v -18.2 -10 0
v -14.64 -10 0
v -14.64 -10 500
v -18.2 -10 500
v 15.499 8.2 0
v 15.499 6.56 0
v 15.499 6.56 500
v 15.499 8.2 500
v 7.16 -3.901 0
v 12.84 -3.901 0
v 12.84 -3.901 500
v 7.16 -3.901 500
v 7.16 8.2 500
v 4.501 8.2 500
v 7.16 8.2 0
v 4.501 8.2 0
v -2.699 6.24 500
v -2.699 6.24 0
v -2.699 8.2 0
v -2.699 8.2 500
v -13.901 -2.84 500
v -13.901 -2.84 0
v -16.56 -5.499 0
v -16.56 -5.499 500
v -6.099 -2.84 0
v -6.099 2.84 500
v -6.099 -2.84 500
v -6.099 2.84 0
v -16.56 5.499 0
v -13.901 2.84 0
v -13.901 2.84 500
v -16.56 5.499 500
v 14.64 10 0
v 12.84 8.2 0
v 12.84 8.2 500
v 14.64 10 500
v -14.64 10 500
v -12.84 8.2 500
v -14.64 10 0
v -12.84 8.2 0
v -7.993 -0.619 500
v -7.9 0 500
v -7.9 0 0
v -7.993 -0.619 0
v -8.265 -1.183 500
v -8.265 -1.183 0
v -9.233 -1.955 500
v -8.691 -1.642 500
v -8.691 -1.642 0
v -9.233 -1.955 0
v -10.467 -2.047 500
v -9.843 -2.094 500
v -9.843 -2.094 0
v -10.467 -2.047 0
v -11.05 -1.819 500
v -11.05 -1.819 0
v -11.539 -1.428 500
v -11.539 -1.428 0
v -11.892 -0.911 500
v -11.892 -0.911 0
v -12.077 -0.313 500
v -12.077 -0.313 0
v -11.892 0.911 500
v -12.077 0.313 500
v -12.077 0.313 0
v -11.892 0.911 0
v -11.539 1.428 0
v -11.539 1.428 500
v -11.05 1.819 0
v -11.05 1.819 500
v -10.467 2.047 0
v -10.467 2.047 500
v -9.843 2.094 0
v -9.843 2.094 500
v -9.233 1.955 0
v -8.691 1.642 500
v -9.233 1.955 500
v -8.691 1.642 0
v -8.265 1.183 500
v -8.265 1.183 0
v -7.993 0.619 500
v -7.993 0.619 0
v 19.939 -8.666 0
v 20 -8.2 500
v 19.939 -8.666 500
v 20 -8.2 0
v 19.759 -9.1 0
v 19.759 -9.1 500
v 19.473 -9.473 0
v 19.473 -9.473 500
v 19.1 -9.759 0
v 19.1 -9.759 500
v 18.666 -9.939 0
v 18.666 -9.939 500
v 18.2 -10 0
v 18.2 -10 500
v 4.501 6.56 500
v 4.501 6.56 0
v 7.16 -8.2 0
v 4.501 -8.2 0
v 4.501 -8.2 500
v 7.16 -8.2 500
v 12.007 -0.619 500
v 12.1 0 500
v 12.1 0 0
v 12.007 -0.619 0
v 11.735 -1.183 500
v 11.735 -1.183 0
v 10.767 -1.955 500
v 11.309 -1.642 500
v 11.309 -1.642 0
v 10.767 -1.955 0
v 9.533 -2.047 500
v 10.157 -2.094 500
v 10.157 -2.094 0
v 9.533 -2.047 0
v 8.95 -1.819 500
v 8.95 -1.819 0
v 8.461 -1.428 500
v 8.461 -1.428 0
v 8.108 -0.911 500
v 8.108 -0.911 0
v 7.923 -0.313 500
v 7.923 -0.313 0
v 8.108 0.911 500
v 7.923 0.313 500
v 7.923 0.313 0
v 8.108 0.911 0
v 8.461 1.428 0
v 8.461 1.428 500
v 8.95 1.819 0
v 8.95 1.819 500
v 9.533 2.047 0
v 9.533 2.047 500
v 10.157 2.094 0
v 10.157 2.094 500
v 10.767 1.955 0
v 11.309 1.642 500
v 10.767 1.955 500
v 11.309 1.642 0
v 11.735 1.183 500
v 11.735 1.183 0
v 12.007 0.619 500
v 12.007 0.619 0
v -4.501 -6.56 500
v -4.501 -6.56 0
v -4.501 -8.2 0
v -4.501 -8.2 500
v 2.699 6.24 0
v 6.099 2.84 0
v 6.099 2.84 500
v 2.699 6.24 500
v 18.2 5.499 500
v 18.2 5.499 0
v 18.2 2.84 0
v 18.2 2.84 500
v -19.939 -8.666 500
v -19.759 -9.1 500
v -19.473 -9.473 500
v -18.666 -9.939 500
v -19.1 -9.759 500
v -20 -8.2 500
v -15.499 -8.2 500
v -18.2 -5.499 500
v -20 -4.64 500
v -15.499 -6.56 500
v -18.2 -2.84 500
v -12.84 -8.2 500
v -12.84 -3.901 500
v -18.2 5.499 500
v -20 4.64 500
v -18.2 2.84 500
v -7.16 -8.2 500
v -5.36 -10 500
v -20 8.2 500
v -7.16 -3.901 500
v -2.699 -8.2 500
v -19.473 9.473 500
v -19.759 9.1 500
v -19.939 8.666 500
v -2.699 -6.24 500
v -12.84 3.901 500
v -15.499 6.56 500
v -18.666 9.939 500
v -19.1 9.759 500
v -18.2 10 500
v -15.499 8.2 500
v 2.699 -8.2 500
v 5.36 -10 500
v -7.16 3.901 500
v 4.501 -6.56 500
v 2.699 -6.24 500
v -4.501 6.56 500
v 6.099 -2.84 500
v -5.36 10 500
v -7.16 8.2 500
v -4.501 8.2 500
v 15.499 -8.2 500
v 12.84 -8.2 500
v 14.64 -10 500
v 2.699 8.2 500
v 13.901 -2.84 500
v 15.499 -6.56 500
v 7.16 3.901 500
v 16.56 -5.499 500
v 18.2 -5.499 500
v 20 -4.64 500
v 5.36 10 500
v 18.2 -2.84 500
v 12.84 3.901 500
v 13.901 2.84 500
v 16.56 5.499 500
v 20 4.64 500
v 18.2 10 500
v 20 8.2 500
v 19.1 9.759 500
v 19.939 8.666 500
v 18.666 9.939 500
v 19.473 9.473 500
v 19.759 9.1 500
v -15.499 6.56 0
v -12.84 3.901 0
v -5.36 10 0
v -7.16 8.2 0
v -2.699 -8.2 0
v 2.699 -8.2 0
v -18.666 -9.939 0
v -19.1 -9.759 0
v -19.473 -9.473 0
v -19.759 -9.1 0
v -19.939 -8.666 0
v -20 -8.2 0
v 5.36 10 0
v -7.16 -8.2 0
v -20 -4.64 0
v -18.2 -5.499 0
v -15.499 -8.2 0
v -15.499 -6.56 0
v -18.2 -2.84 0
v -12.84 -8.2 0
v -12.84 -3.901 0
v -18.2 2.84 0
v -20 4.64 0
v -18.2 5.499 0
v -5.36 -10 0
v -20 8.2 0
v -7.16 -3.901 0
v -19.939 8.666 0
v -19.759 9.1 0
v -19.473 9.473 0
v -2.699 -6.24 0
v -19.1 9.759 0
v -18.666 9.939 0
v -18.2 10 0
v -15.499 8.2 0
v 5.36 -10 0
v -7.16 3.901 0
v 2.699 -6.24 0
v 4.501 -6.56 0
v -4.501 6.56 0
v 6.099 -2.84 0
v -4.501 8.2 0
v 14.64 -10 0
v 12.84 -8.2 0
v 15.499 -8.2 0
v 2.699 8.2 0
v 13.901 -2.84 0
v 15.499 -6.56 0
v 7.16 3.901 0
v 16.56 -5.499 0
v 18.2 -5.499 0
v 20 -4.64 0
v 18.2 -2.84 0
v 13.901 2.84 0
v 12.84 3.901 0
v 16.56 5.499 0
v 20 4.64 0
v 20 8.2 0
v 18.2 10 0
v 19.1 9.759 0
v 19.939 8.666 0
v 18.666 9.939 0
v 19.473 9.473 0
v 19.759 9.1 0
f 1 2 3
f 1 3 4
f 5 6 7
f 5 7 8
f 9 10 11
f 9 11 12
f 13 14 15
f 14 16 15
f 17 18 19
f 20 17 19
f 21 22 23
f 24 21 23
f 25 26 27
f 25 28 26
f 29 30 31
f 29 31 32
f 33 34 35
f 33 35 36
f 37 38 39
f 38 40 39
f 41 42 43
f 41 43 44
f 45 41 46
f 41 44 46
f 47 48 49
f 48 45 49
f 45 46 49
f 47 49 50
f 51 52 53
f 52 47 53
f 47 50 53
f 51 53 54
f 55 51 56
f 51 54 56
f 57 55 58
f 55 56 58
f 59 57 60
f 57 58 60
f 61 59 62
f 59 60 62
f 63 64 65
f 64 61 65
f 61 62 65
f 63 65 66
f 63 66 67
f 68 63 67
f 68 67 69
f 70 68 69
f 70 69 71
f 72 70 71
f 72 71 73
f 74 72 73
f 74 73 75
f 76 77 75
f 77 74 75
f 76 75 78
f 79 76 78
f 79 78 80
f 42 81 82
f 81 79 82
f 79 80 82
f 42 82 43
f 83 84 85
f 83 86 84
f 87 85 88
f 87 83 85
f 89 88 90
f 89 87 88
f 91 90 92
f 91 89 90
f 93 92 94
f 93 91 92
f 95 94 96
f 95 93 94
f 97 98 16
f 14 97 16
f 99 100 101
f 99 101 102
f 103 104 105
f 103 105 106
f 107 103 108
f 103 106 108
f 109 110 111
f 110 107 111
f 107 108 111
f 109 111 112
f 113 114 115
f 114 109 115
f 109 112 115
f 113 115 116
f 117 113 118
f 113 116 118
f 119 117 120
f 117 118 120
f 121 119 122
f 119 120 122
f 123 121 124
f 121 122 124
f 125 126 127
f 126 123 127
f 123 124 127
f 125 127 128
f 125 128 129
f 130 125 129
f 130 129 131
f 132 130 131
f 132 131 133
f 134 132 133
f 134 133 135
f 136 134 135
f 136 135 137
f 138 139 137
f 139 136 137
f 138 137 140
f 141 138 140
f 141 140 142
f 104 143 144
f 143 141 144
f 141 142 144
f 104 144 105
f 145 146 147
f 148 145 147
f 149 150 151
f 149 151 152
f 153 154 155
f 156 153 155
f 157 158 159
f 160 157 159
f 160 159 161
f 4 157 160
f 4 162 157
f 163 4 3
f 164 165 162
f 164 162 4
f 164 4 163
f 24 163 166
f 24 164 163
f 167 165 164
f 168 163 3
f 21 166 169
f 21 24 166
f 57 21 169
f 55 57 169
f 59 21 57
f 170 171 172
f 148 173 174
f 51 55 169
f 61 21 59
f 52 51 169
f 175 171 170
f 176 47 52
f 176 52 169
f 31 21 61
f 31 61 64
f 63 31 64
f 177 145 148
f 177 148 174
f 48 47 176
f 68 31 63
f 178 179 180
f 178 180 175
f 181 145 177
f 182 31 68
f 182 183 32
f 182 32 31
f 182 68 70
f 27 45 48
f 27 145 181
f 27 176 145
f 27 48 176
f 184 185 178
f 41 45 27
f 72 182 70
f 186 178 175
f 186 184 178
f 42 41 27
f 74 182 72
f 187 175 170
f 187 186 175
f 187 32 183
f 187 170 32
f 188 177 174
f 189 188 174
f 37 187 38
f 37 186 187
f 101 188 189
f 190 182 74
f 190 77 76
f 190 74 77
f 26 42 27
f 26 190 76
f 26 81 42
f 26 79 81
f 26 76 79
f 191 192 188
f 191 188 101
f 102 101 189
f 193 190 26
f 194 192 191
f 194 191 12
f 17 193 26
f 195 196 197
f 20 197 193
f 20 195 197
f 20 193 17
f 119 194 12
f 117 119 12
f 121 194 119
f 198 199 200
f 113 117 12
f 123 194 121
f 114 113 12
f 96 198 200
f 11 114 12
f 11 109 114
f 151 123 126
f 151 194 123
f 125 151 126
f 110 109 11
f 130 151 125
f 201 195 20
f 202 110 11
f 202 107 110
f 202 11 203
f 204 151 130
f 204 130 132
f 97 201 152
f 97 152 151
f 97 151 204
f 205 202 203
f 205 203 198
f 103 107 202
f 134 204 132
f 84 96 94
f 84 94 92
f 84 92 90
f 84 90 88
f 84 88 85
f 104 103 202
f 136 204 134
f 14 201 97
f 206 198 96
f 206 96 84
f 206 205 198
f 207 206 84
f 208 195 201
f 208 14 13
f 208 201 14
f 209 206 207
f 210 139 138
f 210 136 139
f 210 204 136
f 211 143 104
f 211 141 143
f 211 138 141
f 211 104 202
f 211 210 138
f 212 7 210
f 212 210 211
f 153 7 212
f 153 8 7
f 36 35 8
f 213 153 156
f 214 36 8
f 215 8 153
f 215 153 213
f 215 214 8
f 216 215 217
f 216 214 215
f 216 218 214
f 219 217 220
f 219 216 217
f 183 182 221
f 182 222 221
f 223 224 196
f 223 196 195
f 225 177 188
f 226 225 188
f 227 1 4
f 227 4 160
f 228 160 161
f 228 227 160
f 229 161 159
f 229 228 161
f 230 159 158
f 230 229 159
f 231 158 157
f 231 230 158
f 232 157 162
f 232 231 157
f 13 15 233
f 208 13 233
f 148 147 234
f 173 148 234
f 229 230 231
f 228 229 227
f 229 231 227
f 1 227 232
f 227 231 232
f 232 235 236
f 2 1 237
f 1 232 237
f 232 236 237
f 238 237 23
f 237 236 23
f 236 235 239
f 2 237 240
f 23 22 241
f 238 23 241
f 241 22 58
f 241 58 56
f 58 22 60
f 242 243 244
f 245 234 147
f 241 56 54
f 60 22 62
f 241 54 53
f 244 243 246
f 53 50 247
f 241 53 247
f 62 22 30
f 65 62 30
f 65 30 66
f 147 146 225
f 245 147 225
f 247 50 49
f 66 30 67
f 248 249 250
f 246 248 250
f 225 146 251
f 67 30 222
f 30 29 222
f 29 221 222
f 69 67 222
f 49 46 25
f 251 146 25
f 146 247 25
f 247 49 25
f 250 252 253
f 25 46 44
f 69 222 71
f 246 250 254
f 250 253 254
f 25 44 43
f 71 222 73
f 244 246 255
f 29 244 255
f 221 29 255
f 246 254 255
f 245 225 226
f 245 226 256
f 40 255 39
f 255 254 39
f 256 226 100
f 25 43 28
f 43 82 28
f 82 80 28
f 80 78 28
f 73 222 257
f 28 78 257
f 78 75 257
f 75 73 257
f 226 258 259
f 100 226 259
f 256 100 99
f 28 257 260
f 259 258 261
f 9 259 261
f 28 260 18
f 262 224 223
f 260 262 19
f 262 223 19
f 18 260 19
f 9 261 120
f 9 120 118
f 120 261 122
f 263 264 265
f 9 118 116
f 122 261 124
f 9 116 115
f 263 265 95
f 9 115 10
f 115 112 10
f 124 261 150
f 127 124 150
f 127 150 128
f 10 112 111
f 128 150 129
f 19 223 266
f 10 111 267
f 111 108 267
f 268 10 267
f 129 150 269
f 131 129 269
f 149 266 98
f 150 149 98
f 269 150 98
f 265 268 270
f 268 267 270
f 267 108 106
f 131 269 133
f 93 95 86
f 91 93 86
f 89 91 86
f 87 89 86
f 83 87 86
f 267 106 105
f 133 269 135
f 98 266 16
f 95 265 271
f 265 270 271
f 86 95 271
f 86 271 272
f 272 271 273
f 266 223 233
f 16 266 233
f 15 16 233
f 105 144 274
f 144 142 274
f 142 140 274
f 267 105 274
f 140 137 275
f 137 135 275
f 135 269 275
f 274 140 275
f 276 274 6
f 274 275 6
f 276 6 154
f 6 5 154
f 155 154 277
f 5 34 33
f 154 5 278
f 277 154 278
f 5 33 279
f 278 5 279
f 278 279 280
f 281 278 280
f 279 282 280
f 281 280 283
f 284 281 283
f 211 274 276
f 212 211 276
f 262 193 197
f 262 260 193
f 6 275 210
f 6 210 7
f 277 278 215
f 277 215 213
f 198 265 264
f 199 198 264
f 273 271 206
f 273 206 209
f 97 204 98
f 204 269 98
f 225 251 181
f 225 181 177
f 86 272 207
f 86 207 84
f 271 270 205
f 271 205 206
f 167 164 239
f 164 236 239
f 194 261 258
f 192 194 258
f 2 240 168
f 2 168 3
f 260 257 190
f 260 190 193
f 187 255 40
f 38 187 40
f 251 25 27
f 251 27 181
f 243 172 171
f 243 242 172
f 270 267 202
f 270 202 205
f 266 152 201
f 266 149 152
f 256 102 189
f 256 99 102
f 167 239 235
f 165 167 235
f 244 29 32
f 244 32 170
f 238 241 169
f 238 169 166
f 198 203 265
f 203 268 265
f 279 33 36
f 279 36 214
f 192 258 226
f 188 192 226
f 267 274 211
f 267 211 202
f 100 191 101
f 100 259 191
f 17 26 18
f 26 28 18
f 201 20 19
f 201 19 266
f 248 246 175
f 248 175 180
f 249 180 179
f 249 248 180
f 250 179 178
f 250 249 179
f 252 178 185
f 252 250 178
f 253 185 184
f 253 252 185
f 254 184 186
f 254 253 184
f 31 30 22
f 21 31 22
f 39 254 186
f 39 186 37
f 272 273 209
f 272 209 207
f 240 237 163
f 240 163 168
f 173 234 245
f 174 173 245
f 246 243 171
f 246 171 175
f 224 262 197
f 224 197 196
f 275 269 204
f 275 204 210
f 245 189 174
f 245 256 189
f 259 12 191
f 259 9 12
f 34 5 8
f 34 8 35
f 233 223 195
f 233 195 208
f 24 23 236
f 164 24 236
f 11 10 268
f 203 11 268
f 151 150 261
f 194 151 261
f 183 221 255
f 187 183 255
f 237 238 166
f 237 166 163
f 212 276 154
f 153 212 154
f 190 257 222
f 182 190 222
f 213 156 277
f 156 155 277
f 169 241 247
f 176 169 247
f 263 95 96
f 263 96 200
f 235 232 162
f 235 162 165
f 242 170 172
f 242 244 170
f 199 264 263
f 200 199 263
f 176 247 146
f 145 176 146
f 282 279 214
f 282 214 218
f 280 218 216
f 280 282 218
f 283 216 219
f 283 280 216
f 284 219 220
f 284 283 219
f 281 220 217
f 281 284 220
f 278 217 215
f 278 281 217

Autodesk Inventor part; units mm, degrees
ref_plane "YZ Plane" through (0, 0, 0) normal (1, 0, 0) x (0, 1, 0)
ref_plane "Start Plane" through (0, 0, 0) normal (0, 0, 1) x (1, 0, 0)
ref_plane "End Plane" through (0, 0, 10) normal (0, 0, 1) x (1, 0, 0)
sketch "Sketch3" plane through (0, 0, 0) normal (0, 0, 1) x (1, 0, 0)
  line L0 (0, 0) -> (0, 10) construction
  line L1 (-10, 10) -> (-10, 0) construction
  line L2 (0, 0) -> (-10, 0) construction
  circle A0 centre (-10, 0) radius 2.1
  line L3 (-13.9007, 3.9007) -> (-6.0993, 3.9007) construction
  line L4 (-6.0993, 3.9007) -> (-6.0993, -3.9007) construction
  line L5 (-6.0993, -3.9007) -> (-13.9007, -3.9007) construction
  line L6 (-13.9007, -3.9007) -> (-13.9007, 3.9007) construction
  line L7 (-13.9007, 3.9007) -> (-6.0993, -3.9007) construction
  line L8 (-6.0993, 3.9007) -> (-13.9007, -3.9007) construction
  line L9 (-13.9007, -2.84) -> (-12.84, -3.9007) construction
  line L10 (-13.9007, -2.84) -> (-12.4007, -2.84) construction
  line L11 (-12.84, -3.9007) -> (-15.4993, -6.56)
  line L12 (-15.4993, -6.56) -> (-15.4993, -8.2)
  line L13 (-15.4993, -8.2) -> (-12.84, -8.2)
  line L14 (-12.84, -8.2) -> (-14.64, -10)
  line L15 (-7.16, -3.9007) -> (-4.5007, -6.56)
  line L16 (-4.5007, -6.56) -> (-4.5007, -8.2)
  line L17 (-4.5007, -8.2) -> (-7.16, -8.2)
  line L18 (-7.16, -8.2) -> (-5.36, -10)
  line L19 (-12.84, -3.9007) -> (-7.16, -3.9007)
  line L20 (-12.84, 3.9007) -> (-13.9007, 2.84) construction
  line L21 (-12.84, 3.9007) -> (-12.84, 2.4007) construction
  line L22 (-13.9007, 2.84) -> (-16.56, 5.4993)
  line L23 (-16.56, 5.4993) -> (-18.2, 5.4993)
  line L24 (-18.2, 5.4993) -> (-18.2, 2.84)
  line L25 (-18.2, 2.84) -> (-20, 4.64)
  line L26 (-18.2, -2.84) -> (-20, -4.64)
  line L27 (-18.2, -5.4993) -> (-18.2, -2.84)
  line L28 (-16.56, -5.4993) -> (-18.2, -5.4993)
  line L29 (-13.9007, -2.84) -> (-16.56, -5.4993)
  line L30 (-13.9007, 2.84) -> (-13.9007, -2.84)
  line L31 (-6.0993, 2.84) -> (-7.16, 3.9007) construction
  line L32 (-6.0993, 2.84) -> (-7.5993, 2.84) construction
  line L33 (-7.16, 3.9007) -> (-4.5007, 6.56)
  line L34 (-4.5007, 6.56) -> (-4.5007, 8.2)
  line L35 (-4.5007, 8.2) -> (-7.16, 8.2)
  line L36 (-7.16, 8.2) -> (-5.36, 10)
  line L37 (-12.84, 8.2) -> (-14.64, 10)
  line L38 (-15.4993, 8.2) -> (-12.84, 8.2)
  line L39 (-15.4993, 6.56) -> (-15.4993, 8.2)
  line L40 (-12.84, 3.9007) -> (-15.4993, 6.56)
  line L41 (-7.16, 3.9007) -> (-12.84, 3.9007)
  line L42 (-6.0993, 2.84) -> (-2.6993, 6.24)
  line L43 (-2.6993, 6.24) -> (-2.6993, 8.2)
  line L44 (-4.5007, 8.2) -> (0, 8.2) construction
  line L45 (-6.0993, -2.84) -> (-2.6993, -6.24)
  line L46 (-2.6993, -6.24) -> (-2.6993, -8.2)
  line L47 (10, 10) -> (10, 0) construction
  circle A1 centre (10, 0) radius 2.1
  line L48 (13.9007, 3.9007) -> (6.0993, -3.9007) construction
  line L49 (13.9007, -2.84) -> (12.84, -3.9007) construction
  line L50 (12.84, -3.9007) -> (15.4993, -6.56)
  line L51 (15.4993, -6.56) -> (15.4993, -8.2)
  line L52 (15.4993, -8.2) -> (12.84, -8.2)
  line L53 (12.84, -8.2) -> (14.64, -10)
  line L54 (7.16, -8.2) -> (5.36, -10)
  line L55 (4.5007, -8.2) -> (7.16, -8.2)
  line L56 (4.5007, -6.56) -> (4.5007, -8.2)
  line L57 (7.16, -3.9007) -> (4.5007, -6.56)
  line L58 (12.84, -3.9007) -> (7.16, -3.9007)
  line L59 (13.9007, 2.84) -> (13.9007, -2.84)
  line L60 (13.9007, 2.84) -> (16.56, 5.4993)
  line L61 (16.56, 5.4993) -> (18.2, 5.4993)
  line L62 (18.2, 5.4993) -> (18.2, 2.84)
  line L63 (18.2, 2.84) -> (20, 4.64)
  line L64 (18.2, -5.4993) -> (18.2, -2.84)
  line L65 (18.2, -2.84) -> (20, -4.64)
  line L66 (16.56, -5.4993) -> (18.2, -5.4993)
  line L67 (13.9007, -2.84) -> (16.56, -5.4993)
  line L68 (7.16, 3.9007) -> (12.84, 3.9007)
  line L69 (7.16, 3.9007) -> (4.5007, 6.56)
  line L70 (4.5007, 6.56) -> (4.5007, 8.2)
  line L71 (4.5007, 8.2) -> (7.16, 8.2)
  line L72 (7.16, 8.2) -> (5.36, 10)
  line L73 (15.4993, 8.2) -> (12.84, 8.2)
  line L74 (12.84, 8.2) -> (14.64, 10)
  line L75 (15.4993, 6.56) -> (15.4993, 8.2)
  line L76 (12.84, 3.9007) -> (15.4993, 6.56)
  line L77 (6.0993, 2.84) -> (2.6993, 6.24)
  line L78 (2.6993, 6.24) -> (2.6993, 8.2)
  line L79 (6.0993, -2.84) -> (2.6993, -6.24)
  line L80 (2.6993, -6.24) -> (2.6993, -8.2)
  line L81 (-14.64, -10) -> (-18.2, -10)
  line L82 (-20, -8.2) -> (-20, -4.64)
  line L83 (-20, 4.64) -> (-20, 8.2)
  line L84 (-18.2, 10) -> (-14.64, 10)
  line L85 (18.2, -10) -> (14.64, -10)
  line L86 (5.36, -10) -> (-5.36, -10)
  line L87 (-5.36, 10) -> (5.36, 10)
  line L88 (14.64, 10) -> (18.2, 10)
  line L89 (20, 8.2) -> (20, 4.64)
  line L90 (20, -4.64) -> (20, -8.2)
  line L91 (-2.6993, -8.2) -> (2.6993, -8.2)
  line L92 (-2.6993, 8.2) -> (2.6993, 8.2)
  line L93 (-6.0993, 2.84) -> (-6.0993, -2.84)
  line L94 (6.0993, 2.84) -> (6.0993, -2.84)
  arc A2 (-20, -8.2) -> (-18.2, -10) centre (-18.2, -8.2) ccw
  arc A3 (-18.2, 10) -> (-20, 8.2) centre (-18.2, 8.2) ccw
  arc A4 (18.2, -10) -> (20, -8.2) centre (18.2, -8.2) ccw
  arc A5 (20, 8.2) -> (18.2, 10) centre (18.2, 8.2) ccw
  point P0 (-13.9007, -3.9007)
  point P1 (-13.9007, 3.9007)
  point P2 (-13.9007, 3.9007)
  point P3 (-6.0993, 3.9007)
  point P4 (6.0993, 3.9007)
  point P5 (13.9007, -3.9007)
  point P6 (12.4007, -2.84)
  point P7 (13.9007, -3.9007)
  point P8 (13.9007, 3.9007)
  point P9 (12.84, 3.9007)
  point P10 (12.84, 2.4007)
  point P11 (13.9007, 3.9007)
  point P12 (6.0993, 3.9007)
  point P13 (7.5993, 2.84)
  point P14 (-20, 10)
  point P15 (20, -10)
  point P16 (20, 10)
  point P17 (-20, -10)
  dimension "d26" = 10
  dimension "d27" = 10
  dimension "d28" = 4.2
  dimension "d29" = 1.5
  dimension "d30" = 45
  dimension "d32" = 45
  dimension "d33" = 1.64
  dimension "d34" = 1.8
  dimension "d35" = 10
  dimension "d36" = 5.68
  dimension "d39" = 180
  dimension "d41" = 1.96
  dimension "d42" = 5.68
  dimension "d45" = 1.8
extrude "Body" add sketch "Sketch3" along normal blind 500
sketch "Sketch4" plane through (0, 0, 0) normal (0, 0, 1) x (1, 0, 0)
  line L0 (0, 0) -> (10, 0)
ref_plane "Work Plane3" through (0, 0, 0) normal (0, -1, 0) x (1, 0, 0)
sketch "Sketch5" plane through (0, 0, 0) normal (0, -1, 0) x (1, 0, 0)
  line L0 (-2, 0) -> (12, 0)
  line L1 (-2, 10) -> (12, 10)
  dimension "d51" = 10
equation "\"d42\" = d36"
equation "\"G_OFFSET_START\" = 0"
equation "\"G_OFFSET_END\" = 0"
equation "\"G_L\" = d51"
properties part number "vslot 20 x 40" material "Aluminum 6061"
